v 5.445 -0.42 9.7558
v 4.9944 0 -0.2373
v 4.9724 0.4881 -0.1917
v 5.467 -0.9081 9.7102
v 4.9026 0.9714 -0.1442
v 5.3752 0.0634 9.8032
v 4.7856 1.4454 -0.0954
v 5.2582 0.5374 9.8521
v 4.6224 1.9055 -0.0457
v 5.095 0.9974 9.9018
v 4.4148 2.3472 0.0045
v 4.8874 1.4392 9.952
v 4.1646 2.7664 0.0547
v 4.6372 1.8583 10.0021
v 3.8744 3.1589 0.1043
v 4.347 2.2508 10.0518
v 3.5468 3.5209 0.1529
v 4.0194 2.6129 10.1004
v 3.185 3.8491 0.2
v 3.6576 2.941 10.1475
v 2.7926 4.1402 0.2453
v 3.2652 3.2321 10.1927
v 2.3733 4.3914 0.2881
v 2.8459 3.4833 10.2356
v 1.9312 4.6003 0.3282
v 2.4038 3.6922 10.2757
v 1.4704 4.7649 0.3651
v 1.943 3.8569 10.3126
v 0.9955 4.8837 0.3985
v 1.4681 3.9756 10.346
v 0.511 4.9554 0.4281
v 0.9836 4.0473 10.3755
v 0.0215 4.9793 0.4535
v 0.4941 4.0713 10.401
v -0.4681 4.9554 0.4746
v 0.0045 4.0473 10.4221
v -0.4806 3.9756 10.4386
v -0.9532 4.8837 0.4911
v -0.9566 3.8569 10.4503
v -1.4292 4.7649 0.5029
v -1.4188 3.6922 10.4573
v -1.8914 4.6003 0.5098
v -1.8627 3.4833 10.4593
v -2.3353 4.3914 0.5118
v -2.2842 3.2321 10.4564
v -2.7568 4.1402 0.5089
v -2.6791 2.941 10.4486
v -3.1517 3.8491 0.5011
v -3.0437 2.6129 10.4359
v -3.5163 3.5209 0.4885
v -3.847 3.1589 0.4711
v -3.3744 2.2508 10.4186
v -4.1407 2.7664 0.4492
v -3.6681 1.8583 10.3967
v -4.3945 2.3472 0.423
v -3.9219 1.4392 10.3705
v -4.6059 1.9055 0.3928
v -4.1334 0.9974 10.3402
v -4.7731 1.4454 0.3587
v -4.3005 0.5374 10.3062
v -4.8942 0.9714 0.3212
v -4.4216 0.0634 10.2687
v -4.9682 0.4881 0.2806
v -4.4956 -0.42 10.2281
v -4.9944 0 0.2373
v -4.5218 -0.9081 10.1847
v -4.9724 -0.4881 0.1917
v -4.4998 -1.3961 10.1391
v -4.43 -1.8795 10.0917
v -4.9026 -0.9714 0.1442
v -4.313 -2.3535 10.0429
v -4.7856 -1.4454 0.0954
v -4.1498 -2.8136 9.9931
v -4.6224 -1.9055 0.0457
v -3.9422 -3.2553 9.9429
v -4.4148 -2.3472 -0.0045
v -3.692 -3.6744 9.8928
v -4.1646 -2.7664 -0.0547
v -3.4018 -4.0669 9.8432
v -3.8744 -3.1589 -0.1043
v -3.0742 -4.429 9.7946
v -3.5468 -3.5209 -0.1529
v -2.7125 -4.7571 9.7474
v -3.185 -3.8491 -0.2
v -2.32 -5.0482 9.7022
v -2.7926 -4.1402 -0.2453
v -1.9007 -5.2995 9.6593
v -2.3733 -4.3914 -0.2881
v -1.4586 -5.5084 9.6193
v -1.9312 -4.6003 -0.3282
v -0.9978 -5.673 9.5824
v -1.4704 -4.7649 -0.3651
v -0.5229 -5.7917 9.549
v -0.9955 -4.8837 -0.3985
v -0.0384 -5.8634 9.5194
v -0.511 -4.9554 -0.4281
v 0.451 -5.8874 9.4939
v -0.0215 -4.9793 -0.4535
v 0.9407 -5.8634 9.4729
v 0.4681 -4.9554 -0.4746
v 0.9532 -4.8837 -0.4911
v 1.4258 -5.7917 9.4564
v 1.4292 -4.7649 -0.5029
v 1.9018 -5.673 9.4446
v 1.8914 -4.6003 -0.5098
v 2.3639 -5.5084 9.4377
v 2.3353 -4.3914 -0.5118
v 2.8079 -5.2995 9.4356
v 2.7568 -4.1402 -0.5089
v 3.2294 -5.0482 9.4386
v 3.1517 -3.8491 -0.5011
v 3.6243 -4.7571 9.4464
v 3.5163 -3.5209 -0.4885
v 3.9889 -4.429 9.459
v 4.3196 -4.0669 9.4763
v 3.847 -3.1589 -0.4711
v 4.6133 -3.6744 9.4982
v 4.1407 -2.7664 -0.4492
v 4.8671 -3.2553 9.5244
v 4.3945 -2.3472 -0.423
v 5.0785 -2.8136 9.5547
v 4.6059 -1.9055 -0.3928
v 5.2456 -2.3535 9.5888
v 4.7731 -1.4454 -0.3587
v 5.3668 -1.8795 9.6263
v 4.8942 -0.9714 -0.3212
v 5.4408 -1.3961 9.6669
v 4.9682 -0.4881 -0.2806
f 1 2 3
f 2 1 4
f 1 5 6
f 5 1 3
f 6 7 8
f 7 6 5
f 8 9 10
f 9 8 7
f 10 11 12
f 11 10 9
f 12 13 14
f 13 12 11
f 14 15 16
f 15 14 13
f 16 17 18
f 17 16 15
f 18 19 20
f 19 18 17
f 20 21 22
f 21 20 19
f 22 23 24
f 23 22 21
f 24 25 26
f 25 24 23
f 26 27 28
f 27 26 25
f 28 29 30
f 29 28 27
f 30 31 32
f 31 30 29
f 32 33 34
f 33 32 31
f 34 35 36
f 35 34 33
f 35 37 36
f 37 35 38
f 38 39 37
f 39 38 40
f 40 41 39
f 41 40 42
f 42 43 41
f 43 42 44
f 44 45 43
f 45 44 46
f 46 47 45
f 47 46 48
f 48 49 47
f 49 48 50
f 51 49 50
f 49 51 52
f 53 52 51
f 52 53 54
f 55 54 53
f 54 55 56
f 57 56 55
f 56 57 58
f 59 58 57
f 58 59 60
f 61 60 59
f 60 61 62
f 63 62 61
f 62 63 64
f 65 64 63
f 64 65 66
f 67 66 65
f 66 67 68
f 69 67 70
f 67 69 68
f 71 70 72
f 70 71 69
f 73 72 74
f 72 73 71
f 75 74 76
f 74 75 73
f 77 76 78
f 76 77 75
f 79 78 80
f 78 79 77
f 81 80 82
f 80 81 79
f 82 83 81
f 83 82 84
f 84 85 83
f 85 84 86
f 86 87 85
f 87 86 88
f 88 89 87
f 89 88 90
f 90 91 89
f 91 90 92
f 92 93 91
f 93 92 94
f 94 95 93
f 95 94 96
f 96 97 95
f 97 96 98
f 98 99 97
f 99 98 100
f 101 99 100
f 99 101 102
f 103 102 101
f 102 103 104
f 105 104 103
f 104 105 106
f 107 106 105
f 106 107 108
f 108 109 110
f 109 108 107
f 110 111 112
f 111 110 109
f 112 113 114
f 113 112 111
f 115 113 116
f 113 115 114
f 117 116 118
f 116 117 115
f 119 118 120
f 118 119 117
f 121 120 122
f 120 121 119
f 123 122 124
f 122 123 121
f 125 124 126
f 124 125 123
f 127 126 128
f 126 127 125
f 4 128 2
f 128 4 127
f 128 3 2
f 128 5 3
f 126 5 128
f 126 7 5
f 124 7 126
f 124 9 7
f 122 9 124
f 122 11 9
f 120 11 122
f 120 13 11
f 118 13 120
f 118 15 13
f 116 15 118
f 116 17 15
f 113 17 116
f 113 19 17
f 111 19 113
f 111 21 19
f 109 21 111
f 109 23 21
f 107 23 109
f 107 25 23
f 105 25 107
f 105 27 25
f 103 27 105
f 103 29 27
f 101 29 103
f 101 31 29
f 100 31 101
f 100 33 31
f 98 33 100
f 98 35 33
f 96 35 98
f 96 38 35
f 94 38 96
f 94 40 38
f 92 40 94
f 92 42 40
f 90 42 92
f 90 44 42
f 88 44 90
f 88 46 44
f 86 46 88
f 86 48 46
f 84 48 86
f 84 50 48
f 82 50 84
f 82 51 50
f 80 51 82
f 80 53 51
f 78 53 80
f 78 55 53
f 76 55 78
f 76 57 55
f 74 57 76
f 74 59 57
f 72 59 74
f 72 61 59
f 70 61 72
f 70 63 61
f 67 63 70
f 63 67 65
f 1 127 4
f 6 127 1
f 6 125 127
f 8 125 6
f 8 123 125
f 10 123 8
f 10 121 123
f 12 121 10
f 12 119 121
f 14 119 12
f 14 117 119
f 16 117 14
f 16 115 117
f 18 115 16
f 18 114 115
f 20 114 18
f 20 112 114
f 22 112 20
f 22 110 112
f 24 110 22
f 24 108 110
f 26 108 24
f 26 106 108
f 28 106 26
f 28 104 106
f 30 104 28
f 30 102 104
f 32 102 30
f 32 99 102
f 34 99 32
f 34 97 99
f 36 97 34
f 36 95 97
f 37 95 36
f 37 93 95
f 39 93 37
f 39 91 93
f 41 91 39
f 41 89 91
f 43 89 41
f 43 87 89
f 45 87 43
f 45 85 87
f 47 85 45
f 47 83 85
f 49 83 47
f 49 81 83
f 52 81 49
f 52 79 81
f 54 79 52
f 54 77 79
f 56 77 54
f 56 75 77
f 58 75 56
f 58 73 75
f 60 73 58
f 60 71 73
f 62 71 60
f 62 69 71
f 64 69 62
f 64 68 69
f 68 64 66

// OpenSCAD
rotate([5.21, 2.72, 0]) {
    cylinder(h=10, r=5, $fn=64);
}
